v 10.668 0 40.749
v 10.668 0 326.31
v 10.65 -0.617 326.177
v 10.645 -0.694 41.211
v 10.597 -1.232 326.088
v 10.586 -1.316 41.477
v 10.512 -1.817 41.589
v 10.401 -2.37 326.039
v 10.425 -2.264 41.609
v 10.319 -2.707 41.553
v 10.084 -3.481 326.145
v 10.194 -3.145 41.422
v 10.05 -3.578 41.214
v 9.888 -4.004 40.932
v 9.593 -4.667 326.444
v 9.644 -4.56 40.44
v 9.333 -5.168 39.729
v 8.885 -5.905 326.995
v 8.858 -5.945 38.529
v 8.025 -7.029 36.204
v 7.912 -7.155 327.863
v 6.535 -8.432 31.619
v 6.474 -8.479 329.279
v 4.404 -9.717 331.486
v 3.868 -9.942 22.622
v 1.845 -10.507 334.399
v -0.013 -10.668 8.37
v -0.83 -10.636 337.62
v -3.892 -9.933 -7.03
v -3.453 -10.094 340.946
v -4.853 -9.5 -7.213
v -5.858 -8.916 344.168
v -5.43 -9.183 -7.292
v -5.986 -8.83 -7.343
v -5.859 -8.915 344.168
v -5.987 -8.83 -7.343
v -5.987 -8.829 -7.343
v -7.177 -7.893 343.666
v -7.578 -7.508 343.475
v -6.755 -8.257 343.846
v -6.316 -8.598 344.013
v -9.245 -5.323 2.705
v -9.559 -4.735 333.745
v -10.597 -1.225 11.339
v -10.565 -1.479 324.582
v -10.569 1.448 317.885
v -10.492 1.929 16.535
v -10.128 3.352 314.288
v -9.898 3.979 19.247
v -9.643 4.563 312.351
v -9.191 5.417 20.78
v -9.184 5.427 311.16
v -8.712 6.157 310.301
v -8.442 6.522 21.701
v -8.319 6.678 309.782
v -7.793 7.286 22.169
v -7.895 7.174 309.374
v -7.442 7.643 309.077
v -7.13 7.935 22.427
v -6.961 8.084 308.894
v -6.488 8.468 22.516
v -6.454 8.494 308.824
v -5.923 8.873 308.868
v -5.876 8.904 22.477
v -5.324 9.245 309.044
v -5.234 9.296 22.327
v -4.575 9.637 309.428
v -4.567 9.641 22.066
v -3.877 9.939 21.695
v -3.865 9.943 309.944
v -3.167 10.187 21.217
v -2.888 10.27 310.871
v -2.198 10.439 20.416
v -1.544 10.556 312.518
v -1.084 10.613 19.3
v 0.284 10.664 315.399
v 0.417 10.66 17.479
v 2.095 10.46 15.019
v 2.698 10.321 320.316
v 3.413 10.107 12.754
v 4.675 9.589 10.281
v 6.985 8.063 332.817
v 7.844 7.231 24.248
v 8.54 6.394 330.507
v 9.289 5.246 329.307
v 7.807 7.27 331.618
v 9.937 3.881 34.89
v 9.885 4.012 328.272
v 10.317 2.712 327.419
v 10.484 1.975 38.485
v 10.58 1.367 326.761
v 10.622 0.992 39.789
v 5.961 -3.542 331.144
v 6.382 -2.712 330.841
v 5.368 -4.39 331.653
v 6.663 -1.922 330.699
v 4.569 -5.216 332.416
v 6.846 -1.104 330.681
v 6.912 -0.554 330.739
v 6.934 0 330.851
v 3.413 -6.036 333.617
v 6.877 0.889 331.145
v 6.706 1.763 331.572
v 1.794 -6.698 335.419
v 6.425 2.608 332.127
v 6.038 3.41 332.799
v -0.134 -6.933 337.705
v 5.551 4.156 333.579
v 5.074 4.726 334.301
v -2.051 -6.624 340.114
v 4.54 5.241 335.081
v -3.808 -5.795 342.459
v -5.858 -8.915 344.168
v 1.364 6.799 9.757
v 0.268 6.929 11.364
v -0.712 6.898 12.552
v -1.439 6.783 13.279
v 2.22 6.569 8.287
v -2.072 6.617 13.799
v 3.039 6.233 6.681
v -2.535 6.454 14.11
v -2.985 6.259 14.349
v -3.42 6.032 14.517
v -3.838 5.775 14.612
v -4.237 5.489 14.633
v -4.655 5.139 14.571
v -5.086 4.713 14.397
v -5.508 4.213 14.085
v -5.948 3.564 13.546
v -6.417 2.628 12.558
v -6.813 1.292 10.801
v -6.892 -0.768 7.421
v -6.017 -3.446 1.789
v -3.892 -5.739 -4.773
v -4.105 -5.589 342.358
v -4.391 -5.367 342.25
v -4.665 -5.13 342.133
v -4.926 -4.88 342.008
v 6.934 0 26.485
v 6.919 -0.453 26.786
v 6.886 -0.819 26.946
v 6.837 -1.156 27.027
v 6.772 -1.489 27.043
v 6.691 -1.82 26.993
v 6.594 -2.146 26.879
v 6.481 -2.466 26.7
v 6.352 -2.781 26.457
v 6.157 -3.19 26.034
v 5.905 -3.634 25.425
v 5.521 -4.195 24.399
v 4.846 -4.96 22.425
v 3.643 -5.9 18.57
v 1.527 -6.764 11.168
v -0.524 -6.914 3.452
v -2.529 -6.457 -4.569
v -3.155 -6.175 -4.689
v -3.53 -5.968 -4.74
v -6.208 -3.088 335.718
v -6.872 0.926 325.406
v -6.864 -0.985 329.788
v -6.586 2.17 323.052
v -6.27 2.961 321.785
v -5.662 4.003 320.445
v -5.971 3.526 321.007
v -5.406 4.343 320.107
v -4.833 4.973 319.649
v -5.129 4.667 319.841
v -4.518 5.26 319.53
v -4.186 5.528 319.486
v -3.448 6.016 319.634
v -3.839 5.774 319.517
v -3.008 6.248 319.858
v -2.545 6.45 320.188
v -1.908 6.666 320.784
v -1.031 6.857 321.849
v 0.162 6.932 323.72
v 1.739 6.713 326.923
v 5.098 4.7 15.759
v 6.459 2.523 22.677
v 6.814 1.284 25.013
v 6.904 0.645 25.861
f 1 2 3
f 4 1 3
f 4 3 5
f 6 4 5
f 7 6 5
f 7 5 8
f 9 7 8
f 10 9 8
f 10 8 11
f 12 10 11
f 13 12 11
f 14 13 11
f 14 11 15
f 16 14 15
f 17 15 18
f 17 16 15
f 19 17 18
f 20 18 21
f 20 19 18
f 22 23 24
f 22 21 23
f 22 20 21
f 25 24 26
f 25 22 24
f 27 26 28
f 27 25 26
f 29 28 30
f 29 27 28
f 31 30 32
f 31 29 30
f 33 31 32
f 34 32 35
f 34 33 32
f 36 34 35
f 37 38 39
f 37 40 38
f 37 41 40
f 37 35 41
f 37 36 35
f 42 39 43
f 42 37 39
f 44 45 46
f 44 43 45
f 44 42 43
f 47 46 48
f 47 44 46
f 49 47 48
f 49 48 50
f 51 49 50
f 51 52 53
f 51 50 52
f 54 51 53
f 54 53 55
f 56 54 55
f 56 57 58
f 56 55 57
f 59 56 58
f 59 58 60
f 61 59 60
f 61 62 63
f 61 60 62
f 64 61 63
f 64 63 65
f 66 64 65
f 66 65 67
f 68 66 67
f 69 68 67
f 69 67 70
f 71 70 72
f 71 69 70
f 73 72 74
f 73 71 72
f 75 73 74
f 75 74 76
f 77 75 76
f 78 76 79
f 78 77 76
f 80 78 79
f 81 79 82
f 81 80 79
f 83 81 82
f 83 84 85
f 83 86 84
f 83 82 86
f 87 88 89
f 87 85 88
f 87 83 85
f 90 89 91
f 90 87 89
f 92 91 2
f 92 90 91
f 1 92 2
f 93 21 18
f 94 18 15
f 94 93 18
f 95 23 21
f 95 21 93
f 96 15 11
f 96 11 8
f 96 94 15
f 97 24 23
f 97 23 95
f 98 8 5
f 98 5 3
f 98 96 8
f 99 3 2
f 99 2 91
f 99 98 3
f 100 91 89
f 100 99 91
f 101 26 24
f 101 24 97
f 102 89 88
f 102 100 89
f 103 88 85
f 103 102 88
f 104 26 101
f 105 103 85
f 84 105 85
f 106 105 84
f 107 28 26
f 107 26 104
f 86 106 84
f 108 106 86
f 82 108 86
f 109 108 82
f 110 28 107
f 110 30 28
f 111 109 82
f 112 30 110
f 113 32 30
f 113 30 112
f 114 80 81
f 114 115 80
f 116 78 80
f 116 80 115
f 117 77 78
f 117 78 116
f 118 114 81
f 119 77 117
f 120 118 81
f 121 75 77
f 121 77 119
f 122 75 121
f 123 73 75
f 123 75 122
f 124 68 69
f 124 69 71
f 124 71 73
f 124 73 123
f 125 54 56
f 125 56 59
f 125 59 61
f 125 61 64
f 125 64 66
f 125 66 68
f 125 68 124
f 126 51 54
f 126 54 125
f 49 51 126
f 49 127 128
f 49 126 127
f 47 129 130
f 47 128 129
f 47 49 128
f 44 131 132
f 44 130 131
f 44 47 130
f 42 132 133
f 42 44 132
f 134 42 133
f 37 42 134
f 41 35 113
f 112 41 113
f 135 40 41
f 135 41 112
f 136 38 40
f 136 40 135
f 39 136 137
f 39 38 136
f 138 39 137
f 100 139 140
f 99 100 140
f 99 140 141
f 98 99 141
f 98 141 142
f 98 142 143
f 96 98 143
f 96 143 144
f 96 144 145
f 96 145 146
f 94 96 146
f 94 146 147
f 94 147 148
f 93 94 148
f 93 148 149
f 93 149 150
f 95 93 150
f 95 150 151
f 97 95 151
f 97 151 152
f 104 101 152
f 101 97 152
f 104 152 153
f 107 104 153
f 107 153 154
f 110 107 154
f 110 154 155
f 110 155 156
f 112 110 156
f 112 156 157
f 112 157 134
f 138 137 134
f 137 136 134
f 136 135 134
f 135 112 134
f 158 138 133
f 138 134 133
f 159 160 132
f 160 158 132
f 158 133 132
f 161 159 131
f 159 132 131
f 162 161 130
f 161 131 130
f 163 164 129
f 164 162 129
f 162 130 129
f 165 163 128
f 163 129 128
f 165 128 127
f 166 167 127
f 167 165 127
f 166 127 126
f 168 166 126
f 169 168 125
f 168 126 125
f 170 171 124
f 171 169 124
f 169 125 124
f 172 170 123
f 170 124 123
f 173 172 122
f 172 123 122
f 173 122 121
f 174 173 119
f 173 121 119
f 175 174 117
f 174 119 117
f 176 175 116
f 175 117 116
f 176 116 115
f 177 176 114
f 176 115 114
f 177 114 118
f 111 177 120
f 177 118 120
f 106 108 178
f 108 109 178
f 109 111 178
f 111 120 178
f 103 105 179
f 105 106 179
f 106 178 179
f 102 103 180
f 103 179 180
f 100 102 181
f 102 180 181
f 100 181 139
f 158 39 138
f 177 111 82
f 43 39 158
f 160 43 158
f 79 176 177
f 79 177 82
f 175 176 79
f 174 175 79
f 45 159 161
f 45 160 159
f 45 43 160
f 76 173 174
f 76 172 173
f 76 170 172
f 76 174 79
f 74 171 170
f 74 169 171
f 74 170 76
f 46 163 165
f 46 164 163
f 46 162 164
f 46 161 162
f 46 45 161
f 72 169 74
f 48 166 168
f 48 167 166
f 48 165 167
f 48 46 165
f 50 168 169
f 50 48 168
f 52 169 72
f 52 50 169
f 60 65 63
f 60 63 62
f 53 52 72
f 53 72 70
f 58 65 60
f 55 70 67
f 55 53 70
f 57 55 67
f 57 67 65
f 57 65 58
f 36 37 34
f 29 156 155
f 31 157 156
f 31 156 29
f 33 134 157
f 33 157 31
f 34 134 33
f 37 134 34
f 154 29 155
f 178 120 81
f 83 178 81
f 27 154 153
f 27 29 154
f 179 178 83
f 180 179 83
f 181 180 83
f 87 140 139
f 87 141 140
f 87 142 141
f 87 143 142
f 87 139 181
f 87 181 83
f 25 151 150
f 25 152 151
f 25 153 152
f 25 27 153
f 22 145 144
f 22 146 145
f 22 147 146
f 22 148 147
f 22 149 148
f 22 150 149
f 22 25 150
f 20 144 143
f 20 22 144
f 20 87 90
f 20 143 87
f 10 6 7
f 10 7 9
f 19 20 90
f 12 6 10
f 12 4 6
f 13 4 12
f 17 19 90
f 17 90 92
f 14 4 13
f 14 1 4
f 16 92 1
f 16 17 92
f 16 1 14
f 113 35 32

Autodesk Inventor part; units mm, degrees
ref_plane "Start Plane" through (0, 0, -7.3433) normal (0, 0, 1) x (1, 0, 0)
ref_plane "End Plane" through (0, 0, 344.1675) normal (0, 0, 1) x (1, 0, 0)
sketch "Sketch" plane through (0, 0, 0) normal (0, 0, 1) x (1, 0, 0)
  circle A0 centre (0, 0) radius 6.9342
  circle A1 centre (0, 0) radius 10.668
  dimension "d0" = 21.336
  dimension "d1" = 3.7338
extrude "Body" add sketch "Sketch" along normal up to surface (351.5108 mm away) from surface at -7.3433
sketch "Sketch3" plane through (0, 0, 0) normal (0, 0, 1) x (1, 0, 0)
  line L0 (0, 0) -> (10, 0)
ref_plane "Work Plane3" through (0, 0, 0) normal (0, -1, 0) x (1, 0, 0)
sketch "Sketch4" plane through (0, 0, 0) normal (0, -1, 0) x (1, 0, 0)
  line L0 (-2, -7.3433) -> (12, -7.3433)
  line L1 (-2, 344.1675) -> (12, 344.1675)
  dimension "d7" = 351.5108
ref_plane "Work Plane4" through (-6.6869, -8.3122, -7.3679) normal (0.3562, 0.4428, -0.8228) x (0.2838, -0.8903, -0.3562)
split "Split1" plane through (-6.6869, -8.3122, -7.3679) removes the side toward (0.3562, 0.4428, -0.8228)
ref_plane "Work Plane5" through (6.3956, -8.5383, -22.5235) normal (-0.5418, 0.7233, -0.4281) x (0.4867, 0.6852, 0.5418)
split "Split2" plane through (6.3956, -8.5383, -22.5235) removes the side toward (-0.5418, 0.7233, -0.4281)
ref_plane "Work Plane6" through (-10.4471, 2.1596, -41.6241) normal (0.9486, -0.1961, -0.2483) x (-0.1971, 0.2475, -0.9486)
split "Split3" plane through (-10.4471, 2.1596, -41.6241) removes the side toward (0.9486, -0.1961, -0.2483)
ref_plane "Work Plane7" through (-0.5919, -10.6516, 344.93) normal (0.026, 0.467, 0.8839) x (0.9996, -0.0064, -0.026)
split "Split4" plane through (-0.5919, -10.6516, 344.93) removes the side toward (0.026, 0.467, 0.8839)
ref_plane "Work Plane8" through (-10.4471, 2.1596, 352.5336) normal (0.7628, -0.1577, 0.6272) x (0.6424, 0.0739, -0.7628)
split "Split5" plane through (-10.4471, 2.1596, 352.5336) removes the side toward (0.7628, -0.1577, 0.6272)
ref_plane "Work Plane9" through (6.3956, -8.5383, 369.7521) normal (-0.5658, 0.7554, 0.3305) x (0.7594, 0.3213, 0.5658)
split "Split6" plane through (6.3956, -8.5383, 369.7521) removes the side toward (-0.5658, 0.7554, 0.3305)
equation "\"d0\" = G_H"
equation "\"d1\" = G_T"
equation "\"d2\" = G_L"
equation "\"G_H\" = 21.336"
equation "\"G_T\" = 3.7338"
equation "\"G_L\" = 351.51084"
equation "\"G_OFFSET_START\" = 7.34335"
equation "\"G_OFFSET_END\" = 4.88279"
equation "\"d4\" = -G_OFFSET_START"
equation "\"d5\" = G_OFFSET_END + B_L"
equation "\"B_L\" = 339.28471"
properties part number "ANSI - 1/2 x 0.147 - 13.839" material "Steel, Mild"
